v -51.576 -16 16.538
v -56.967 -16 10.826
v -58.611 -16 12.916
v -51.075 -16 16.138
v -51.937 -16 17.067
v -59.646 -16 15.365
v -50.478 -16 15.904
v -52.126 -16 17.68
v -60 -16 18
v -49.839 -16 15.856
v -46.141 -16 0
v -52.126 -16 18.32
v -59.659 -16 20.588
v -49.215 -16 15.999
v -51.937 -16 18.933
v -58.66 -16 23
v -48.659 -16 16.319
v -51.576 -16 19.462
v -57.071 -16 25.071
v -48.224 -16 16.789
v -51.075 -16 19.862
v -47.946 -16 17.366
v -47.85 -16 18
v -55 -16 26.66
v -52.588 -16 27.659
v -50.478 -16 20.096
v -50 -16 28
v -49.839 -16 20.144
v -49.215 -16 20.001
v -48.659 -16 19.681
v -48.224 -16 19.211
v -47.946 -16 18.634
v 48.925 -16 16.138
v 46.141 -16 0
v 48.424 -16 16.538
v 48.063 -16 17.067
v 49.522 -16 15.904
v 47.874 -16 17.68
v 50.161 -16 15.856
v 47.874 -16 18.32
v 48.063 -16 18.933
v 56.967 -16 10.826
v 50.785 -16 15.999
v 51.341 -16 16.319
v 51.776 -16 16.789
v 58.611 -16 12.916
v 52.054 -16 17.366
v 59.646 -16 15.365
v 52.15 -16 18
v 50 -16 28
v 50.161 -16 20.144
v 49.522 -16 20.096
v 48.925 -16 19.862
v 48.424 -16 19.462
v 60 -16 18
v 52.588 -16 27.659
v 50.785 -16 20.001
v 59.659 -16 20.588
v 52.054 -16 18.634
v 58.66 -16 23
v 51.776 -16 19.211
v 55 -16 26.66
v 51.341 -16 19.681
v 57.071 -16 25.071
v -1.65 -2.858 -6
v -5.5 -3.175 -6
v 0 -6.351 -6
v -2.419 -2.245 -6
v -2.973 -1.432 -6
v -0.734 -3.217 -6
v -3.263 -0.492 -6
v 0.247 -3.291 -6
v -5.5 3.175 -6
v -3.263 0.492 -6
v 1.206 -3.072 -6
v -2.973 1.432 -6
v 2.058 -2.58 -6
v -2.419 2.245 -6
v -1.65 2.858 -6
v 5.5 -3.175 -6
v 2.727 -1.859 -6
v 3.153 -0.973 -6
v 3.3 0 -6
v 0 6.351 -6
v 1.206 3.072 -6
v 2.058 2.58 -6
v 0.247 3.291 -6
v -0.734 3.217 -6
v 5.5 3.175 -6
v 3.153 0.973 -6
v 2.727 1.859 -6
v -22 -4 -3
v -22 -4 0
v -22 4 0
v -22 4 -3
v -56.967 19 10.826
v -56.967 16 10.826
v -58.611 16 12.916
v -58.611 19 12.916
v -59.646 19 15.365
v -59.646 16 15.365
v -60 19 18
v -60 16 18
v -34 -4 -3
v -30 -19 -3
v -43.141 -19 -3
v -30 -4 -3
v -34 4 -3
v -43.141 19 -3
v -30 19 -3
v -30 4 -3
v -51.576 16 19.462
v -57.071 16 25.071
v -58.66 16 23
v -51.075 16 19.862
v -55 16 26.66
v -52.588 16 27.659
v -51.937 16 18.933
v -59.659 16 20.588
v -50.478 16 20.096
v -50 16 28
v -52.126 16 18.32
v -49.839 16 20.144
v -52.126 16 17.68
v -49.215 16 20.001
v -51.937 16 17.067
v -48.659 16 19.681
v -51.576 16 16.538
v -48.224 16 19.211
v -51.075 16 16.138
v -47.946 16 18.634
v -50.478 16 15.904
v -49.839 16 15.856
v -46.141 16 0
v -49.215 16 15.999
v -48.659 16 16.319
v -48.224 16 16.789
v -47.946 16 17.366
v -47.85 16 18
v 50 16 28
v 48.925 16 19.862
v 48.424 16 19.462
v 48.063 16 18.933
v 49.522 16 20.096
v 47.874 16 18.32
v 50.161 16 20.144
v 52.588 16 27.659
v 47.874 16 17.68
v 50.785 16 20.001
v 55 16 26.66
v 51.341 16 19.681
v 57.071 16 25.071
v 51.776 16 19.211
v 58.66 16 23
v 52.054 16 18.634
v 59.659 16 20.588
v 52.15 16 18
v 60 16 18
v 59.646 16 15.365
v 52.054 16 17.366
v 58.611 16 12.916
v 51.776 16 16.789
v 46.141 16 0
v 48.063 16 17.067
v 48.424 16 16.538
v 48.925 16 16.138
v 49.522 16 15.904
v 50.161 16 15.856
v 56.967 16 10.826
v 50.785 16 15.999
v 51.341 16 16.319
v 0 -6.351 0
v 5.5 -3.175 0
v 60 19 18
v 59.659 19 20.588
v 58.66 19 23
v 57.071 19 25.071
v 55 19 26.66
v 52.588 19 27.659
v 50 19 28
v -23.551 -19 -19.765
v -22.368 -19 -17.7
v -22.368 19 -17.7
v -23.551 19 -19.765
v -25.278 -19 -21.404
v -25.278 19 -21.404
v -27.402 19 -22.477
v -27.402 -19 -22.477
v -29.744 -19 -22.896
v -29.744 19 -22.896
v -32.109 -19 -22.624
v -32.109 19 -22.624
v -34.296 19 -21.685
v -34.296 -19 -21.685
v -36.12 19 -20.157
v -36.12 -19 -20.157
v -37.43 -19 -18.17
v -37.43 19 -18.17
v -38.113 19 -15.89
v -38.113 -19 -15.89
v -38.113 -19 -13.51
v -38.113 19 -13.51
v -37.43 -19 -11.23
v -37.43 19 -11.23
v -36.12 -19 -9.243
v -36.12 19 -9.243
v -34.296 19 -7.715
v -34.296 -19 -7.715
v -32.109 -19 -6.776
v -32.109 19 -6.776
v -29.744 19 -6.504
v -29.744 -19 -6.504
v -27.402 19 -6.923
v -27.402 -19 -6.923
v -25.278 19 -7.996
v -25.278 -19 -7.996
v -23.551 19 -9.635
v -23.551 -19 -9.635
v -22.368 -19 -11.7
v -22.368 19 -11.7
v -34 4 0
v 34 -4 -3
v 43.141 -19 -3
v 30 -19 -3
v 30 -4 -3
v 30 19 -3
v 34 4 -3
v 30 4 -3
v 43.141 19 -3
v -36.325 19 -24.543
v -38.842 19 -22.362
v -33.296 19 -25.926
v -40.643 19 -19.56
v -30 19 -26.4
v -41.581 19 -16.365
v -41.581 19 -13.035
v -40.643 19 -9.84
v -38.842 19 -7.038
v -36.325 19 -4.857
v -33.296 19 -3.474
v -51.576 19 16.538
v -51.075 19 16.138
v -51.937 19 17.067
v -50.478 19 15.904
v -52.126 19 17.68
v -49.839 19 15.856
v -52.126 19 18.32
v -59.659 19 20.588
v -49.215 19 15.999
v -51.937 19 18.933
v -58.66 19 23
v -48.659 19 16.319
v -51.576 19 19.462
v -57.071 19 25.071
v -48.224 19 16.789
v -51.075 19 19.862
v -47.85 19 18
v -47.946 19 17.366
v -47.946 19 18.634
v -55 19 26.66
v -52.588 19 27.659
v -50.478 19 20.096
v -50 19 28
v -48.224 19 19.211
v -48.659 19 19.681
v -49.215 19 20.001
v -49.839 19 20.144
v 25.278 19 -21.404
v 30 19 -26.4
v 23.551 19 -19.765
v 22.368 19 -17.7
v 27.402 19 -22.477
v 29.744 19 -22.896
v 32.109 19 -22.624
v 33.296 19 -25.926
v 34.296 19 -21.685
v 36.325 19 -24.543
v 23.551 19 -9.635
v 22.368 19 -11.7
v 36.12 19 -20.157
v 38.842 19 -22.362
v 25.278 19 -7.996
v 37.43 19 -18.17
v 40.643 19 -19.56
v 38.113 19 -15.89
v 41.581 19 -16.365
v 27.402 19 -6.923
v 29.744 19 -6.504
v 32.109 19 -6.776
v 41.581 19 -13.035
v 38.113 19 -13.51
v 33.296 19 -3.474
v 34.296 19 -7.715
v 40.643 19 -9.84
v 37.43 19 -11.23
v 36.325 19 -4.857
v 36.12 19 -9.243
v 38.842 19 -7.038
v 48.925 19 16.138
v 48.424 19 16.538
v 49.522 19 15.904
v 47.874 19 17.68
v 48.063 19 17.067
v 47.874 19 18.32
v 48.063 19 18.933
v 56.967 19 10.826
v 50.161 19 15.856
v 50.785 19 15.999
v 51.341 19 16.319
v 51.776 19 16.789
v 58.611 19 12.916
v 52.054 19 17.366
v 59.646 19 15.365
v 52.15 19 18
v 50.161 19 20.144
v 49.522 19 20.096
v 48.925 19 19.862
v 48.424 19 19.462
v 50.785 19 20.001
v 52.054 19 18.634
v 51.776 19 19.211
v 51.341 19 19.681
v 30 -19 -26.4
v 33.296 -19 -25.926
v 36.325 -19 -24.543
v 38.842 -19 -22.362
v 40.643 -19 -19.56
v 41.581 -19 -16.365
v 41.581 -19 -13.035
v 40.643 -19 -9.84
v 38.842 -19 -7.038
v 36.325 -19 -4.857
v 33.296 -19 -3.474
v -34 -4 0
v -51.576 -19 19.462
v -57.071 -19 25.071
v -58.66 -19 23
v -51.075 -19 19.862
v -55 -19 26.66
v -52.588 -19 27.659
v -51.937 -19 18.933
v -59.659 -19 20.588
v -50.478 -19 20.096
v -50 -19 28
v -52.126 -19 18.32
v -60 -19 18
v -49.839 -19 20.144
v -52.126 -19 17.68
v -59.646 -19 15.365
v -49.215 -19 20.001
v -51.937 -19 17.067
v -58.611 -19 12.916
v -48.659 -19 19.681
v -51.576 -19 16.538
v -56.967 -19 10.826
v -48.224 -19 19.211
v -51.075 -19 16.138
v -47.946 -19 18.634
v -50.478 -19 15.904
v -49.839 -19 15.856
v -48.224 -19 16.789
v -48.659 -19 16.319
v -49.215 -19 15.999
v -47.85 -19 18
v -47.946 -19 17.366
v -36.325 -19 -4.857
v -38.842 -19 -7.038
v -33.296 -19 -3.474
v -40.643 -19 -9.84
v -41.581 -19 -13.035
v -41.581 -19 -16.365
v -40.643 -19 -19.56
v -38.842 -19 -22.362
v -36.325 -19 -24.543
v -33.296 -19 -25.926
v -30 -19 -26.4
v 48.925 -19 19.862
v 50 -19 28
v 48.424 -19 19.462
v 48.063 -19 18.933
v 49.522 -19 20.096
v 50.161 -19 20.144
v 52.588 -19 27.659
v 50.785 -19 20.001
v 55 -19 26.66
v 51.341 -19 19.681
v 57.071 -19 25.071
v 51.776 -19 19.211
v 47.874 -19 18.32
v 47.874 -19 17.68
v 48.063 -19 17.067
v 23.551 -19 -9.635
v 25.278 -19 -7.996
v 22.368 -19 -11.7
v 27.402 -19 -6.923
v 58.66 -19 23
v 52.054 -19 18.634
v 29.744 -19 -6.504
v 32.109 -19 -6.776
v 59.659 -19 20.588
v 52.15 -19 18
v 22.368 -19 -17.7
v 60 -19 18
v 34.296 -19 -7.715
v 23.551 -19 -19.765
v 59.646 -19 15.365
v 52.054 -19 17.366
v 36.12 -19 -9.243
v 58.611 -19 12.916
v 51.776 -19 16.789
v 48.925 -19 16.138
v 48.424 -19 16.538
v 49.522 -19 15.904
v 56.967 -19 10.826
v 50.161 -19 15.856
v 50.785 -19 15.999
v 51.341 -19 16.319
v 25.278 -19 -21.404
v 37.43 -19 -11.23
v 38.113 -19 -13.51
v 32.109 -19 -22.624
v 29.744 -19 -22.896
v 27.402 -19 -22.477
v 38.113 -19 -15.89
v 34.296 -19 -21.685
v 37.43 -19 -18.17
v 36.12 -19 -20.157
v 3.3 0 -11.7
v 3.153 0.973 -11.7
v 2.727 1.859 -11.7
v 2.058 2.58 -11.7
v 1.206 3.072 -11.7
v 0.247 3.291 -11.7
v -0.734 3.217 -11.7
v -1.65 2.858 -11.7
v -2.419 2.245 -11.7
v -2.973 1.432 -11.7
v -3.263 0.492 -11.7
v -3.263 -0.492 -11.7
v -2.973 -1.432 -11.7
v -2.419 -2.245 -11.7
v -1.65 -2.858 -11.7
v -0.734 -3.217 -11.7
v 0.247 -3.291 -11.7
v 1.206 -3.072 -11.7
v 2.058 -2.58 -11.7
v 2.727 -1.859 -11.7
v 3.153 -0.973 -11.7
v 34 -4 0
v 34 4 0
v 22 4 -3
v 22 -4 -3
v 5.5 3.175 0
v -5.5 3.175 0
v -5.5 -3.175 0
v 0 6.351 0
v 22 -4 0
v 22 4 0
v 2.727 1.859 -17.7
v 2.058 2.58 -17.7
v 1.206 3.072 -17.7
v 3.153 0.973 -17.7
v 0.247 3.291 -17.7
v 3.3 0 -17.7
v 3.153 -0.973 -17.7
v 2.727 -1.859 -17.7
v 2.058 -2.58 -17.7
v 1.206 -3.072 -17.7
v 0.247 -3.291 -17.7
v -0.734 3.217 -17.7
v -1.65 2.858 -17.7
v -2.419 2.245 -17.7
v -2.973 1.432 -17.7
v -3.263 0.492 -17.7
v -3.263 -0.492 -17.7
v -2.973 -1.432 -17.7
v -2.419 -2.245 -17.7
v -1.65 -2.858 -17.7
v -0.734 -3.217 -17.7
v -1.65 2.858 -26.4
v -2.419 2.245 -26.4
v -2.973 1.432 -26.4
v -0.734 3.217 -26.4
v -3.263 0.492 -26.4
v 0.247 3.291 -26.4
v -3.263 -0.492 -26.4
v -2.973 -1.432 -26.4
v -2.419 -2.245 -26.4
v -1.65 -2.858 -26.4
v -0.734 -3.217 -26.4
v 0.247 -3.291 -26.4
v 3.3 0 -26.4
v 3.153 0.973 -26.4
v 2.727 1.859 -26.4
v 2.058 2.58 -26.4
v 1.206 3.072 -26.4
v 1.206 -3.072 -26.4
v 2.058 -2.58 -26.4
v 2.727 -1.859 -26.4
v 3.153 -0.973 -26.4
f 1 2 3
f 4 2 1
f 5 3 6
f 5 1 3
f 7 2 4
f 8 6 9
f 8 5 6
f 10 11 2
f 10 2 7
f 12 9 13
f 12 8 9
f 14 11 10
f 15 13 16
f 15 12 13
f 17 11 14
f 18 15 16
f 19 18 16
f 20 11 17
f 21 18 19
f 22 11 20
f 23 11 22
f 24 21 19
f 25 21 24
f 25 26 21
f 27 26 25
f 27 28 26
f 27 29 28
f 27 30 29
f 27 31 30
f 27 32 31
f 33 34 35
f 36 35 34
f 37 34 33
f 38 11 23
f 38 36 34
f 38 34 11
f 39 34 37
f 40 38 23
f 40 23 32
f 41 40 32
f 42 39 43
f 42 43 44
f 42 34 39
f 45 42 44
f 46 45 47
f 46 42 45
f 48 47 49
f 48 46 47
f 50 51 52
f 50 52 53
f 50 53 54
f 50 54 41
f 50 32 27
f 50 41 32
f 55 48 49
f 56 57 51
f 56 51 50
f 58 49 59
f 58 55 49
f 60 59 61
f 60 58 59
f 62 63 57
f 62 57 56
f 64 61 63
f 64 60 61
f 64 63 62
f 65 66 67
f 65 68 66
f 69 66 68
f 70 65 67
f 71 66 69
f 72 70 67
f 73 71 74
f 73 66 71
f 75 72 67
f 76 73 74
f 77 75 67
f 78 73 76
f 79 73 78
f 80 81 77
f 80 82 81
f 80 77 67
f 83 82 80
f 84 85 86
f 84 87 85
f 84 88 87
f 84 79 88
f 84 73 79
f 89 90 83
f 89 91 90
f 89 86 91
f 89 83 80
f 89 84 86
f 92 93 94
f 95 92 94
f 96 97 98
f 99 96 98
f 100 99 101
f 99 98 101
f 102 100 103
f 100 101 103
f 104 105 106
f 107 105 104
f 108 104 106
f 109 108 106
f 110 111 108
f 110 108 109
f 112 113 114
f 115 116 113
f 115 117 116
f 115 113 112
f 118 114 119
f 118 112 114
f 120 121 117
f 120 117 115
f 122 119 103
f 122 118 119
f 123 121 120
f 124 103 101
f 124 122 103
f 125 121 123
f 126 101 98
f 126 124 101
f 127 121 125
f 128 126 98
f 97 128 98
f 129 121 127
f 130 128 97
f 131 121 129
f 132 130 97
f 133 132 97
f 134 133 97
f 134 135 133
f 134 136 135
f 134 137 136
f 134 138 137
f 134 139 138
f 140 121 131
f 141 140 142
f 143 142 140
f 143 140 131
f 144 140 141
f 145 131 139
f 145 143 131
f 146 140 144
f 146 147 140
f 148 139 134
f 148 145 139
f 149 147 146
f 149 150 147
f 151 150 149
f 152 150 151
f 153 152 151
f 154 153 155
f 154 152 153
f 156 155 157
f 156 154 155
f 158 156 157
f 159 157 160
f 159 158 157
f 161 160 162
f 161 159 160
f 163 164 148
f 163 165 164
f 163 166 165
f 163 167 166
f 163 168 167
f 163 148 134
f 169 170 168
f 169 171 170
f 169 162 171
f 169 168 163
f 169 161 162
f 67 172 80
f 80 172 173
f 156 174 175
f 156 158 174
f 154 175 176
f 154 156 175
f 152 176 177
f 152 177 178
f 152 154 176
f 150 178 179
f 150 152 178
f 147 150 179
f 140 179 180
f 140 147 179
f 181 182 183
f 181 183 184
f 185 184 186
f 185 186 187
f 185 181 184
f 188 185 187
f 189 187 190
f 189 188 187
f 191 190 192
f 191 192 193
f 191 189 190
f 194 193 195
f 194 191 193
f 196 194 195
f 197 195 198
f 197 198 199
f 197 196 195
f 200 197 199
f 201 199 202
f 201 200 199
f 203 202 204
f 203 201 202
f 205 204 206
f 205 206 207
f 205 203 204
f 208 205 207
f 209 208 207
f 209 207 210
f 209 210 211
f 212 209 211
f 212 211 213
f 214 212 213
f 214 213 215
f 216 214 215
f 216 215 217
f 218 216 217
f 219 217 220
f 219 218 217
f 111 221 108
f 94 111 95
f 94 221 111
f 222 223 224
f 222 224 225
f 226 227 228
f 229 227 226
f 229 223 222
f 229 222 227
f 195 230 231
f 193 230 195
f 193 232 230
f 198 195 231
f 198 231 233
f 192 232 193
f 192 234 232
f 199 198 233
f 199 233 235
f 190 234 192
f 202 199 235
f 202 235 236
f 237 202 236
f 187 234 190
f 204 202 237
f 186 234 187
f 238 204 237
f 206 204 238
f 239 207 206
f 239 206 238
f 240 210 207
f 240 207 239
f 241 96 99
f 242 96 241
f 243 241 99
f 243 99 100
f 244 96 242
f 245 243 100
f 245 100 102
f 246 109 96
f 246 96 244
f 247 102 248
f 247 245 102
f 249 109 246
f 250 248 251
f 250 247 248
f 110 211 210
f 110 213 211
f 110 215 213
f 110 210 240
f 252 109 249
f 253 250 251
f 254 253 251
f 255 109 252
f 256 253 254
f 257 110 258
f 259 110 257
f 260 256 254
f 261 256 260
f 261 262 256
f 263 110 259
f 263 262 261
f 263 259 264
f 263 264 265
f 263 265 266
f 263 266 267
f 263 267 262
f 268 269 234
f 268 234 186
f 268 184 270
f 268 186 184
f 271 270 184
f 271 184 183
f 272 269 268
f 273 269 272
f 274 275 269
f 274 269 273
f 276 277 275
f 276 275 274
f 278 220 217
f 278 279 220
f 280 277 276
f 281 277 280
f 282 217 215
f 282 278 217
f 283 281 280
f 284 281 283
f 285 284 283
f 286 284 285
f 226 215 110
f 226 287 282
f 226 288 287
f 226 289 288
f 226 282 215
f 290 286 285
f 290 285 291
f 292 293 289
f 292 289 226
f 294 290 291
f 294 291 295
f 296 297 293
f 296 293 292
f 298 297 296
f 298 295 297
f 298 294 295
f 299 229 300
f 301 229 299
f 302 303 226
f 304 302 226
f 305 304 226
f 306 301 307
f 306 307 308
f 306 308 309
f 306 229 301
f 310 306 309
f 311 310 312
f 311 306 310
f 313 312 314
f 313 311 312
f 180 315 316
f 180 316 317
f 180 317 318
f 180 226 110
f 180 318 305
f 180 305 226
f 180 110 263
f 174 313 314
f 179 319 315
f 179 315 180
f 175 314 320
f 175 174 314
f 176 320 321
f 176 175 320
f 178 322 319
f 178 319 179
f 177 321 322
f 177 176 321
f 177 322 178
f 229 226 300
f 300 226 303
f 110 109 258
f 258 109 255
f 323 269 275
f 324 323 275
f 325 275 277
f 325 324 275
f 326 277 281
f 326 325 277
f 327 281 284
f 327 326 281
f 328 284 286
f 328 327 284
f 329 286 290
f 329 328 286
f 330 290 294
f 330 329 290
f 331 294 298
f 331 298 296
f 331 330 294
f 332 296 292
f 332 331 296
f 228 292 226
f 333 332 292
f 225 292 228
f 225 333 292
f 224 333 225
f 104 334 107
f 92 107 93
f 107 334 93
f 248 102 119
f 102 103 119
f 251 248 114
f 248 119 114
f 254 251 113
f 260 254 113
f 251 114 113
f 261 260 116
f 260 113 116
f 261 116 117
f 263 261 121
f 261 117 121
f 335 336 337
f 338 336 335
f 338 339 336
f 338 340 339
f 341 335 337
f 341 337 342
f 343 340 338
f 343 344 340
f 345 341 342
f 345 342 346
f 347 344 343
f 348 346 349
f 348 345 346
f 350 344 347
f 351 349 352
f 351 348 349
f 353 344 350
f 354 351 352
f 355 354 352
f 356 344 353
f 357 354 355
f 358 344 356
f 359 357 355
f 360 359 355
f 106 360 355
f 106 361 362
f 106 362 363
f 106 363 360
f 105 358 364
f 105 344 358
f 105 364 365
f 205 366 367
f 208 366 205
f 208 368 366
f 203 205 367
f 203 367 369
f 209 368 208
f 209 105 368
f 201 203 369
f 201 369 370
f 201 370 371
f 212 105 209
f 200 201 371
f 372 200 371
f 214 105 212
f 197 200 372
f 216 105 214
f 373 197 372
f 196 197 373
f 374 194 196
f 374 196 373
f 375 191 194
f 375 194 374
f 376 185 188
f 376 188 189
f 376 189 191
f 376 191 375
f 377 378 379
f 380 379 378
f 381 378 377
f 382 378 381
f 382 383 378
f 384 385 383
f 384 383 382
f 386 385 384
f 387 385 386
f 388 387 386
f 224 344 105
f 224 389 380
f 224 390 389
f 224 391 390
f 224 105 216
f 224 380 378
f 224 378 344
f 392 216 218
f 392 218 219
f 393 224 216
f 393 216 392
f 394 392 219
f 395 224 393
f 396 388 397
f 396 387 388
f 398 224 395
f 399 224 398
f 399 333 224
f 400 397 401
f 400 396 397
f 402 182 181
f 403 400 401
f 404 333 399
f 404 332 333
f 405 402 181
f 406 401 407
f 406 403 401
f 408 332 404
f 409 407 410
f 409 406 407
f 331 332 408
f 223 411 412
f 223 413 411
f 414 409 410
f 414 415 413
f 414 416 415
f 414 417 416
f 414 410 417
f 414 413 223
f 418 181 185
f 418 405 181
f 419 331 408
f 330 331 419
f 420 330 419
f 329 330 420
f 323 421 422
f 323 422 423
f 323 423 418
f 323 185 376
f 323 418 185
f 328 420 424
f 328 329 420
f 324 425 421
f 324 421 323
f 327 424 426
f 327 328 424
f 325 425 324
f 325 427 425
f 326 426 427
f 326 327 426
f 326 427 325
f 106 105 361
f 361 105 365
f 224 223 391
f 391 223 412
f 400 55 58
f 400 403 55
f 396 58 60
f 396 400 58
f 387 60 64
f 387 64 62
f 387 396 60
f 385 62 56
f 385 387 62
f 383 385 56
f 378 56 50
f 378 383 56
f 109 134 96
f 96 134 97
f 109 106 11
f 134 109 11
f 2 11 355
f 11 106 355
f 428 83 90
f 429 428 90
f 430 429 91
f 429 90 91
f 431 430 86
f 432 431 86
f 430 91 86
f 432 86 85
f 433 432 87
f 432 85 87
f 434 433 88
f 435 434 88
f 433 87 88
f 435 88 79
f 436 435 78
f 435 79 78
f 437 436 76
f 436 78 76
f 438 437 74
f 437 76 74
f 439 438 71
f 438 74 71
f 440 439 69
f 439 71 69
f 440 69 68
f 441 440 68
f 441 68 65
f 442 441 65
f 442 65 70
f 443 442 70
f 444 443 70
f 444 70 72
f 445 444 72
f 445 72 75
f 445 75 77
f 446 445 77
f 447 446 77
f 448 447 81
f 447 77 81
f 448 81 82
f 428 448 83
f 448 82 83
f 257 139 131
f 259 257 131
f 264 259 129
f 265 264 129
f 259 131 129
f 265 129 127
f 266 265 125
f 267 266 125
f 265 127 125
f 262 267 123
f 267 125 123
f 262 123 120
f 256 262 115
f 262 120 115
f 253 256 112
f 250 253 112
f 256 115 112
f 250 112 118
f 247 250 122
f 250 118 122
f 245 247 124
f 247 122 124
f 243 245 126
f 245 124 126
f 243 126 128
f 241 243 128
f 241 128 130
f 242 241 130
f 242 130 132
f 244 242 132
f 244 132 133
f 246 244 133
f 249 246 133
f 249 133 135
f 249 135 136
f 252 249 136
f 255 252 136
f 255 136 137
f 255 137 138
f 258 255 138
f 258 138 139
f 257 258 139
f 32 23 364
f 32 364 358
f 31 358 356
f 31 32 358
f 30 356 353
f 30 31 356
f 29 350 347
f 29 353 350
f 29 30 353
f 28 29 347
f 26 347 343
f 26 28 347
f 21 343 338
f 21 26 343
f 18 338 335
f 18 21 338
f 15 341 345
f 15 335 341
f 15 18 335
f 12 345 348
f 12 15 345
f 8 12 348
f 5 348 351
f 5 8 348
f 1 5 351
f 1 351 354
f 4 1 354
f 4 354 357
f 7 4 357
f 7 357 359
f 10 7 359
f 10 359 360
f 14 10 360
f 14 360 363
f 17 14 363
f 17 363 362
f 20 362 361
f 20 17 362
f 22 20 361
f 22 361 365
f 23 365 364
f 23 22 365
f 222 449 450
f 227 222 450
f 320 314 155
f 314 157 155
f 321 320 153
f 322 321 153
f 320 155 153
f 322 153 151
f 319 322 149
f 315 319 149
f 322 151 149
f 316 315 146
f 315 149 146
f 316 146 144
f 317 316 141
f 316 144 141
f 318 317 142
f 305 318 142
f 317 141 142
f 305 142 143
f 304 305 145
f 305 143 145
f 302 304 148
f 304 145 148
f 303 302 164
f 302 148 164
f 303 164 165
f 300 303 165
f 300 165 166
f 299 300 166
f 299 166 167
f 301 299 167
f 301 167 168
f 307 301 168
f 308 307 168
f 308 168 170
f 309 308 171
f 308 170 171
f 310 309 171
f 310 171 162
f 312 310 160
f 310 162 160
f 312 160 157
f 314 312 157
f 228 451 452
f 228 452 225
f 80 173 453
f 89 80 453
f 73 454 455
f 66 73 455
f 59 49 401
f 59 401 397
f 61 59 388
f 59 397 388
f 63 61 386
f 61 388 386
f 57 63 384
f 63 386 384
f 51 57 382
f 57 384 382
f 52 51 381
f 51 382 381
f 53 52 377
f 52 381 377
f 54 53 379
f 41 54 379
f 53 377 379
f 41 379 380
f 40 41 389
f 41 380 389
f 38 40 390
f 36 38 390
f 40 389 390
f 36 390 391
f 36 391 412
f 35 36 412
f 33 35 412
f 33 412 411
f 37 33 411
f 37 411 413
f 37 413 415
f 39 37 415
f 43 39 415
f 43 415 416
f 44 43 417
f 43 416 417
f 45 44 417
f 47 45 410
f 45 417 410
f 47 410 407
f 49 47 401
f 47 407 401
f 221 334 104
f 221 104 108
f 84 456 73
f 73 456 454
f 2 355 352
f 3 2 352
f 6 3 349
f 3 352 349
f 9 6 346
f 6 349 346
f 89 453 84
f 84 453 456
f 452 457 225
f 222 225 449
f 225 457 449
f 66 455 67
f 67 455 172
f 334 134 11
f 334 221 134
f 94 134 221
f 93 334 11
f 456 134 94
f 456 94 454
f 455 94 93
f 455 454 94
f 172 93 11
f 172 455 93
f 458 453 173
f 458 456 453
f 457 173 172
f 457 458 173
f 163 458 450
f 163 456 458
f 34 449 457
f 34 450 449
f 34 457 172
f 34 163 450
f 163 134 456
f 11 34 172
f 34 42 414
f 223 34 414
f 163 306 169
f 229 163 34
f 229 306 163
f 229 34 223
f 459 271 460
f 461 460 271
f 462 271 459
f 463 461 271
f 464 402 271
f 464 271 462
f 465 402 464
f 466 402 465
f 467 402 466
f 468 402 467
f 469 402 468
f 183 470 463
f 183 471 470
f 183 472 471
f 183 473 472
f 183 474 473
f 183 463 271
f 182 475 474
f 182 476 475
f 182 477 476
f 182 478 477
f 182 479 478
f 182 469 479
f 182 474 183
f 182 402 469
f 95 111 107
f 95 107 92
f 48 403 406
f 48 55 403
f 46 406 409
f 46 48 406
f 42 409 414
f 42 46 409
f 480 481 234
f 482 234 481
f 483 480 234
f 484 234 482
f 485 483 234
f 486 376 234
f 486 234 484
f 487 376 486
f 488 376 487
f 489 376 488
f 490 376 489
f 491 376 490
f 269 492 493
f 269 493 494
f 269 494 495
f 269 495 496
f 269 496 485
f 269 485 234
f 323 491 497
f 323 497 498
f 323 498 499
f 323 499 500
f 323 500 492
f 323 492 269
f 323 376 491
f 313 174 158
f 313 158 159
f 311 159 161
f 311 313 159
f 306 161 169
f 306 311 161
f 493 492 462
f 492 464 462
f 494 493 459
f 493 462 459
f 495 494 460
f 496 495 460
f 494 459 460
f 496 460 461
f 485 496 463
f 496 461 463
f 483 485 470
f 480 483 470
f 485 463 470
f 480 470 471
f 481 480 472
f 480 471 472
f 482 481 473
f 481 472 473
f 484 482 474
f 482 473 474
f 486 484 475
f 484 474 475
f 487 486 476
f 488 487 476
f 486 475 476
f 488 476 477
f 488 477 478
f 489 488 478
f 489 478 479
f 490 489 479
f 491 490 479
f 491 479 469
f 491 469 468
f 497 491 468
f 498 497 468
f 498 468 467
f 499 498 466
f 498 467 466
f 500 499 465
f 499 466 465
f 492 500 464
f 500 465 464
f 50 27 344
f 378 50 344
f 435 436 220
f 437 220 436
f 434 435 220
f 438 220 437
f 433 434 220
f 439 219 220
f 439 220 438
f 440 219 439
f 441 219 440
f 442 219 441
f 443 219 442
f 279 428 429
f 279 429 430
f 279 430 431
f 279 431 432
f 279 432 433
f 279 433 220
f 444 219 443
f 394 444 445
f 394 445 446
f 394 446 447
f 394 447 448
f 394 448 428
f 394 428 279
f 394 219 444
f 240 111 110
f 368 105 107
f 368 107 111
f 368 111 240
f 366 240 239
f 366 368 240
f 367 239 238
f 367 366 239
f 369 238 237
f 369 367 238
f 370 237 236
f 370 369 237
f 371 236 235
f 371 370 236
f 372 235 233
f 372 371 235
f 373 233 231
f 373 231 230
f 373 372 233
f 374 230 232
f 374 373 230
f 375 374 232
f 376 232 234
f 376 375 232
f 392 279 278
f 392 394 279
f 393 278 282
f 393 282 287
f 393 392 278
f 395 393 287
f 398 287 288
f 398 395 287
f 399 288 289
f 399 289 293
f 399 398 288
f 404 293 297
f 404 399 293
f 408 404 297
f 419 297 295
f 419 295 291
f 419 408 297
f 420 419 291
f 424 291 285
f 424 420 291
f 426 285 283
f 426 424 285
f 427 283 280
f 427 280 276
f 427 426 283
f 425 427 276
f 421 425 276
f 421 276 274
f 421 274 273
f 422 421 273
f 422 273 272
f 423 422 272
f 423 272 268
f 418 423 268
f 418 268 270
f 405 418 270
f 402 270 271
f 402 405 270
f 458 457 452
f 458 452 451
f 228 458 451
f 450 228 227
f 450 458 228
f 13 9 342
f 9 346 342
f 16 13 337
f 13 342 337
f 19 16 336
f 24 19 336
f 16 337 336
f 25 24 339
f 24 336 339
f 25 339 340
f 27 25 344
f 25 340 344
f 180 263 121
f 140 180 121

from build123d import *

# Parameters (mm, degrees)
F2_DEPTH  = 60
F4_DEPTH  = 19
F0_R      = 2.15
F5_DEPTH  = 30.3
F6_R      = 10
F7_R      = 3.3
F8_DEPTH  = 29.5
F10_DEPTH = 6
F9_W      = 12
F9_H      = 8
F11_DEPTH = 3
F13_DEPTH = 25


with BuildPart() as f2:
    # F1 (on Right) → F2 (new body, symmetric)
    with BuildSketch(Plane.YZ):
        Polygon((16, 0), (-16, 0), (-16, 28), (-19, 28), (-19, -3), (19, -3), (19, 28), (16, 28), align=None)
    extrude(amount=F2_DEPTH, both=True)

    # F3 (on Front) → F4 (join, symmetric)
    with BuildSketch(Plane.XZ):
        with BuildLine():
            Line((0, -3), (-30, -3))
            ThreePointArc((-30, -3), (-41.7, -14.7), (-30, -26.4))
            Line((-30, -26.4), (0, -26.4))
            Line((0, -26.4), (30, -26.4))
            ThreePointArc((30, -26.4), (41.7, -14.7), (30, -3))
            Line((30, -3), (0, -3))
        make_face()
        with BuildLine():
            ThreePointArc((-22.368486, -17.7), (-38.2, -14.7), (-22.368486, -11.7))
            Line((-22.368486, -11.7), (0, -11.7))
            Line((0, -11.7), (22.368486, -11.7))
            ThreePointArc((22.368486, -11.7), (38.2, -14.7), (22.368486, -17.7))
            Line((22.368486, -17.7), (0, -17.7))
            Line((0, -17.7), (-22.368486, -17.7))
        make_face(mode=Mode.SUBTRACT)
    extrude(amount=F4_DEPTH, both=True)

    # F0 (on Front) → F5 (cut, symmetric)
    with BuildSketch(Plane.XZ):
        with Locations((-50, 18)):
            Circle(F0_R)
        with Locations((50, 18)):
            Circle(F0_R)
    extrude(amount=F5_DEPTH, both=True, mode=Mode.SUBTRACT)

    # F6
    f6_edges = [f2.edges().sort_by_distance(p)[0] for p in [
        (-60, -17.5, 28),
        (-60, 17.5, 28),
        (60, 17.5, 28),
        (60, -17.5, 28),
    ]]
    fillet(f6_edges, radius=F6_R)

    # F7 (on Top) → F8 (cut, symmetric)
    with BuildSketch(Plane.XY):
        Circle(F7_R)
    extrude(amount=F8_DEPTH, both=True, mode=Mode.SUBTRACT)

    # F9 (on Top) → F10 (cut)
    with BuildSketch(Plane.XY):
        Polygon((5.5, -3.175426), (5.5, 3.175426), (0, 6.350853), (-5.5, 3.175426), (-5.5, -3.175426), (0, -6.350853), align=None)
    extrude(amount=-F10_DEPTH, mode=Mode.SUBTRACT)

    # F9 (on Top) → F11 (cut)
    with BuildSketch(Plane.XY):
        with Locations((-28, 0)):
            Rectangle(F9_W, F9_H)
        with Locations((28, 0)):
            Rectangle(F9_W, F9_H)
    extrude(amount=-F11_DEPTH, mode=Mode.SUBTRACT)

    # F12 (on Front) → F13 (cut, symmetric)
    with BuildSketch(Plane.XZ):
        with BuildLine():
            Line((56.966549, 10.825936), (43.140613, -3))
            Line((43.140613, -3), (66.425517, -3))
            Line((66.425517, -3), (66.425517, 22.940923))
            Line((66.425517, 22.940923), (58.694095, 22.940923))
            ThreePointArc((58.694095, 22.940923), (59.899857, 16.588322), (56.966549, 10.825936))
        make_face()
        with BuildLine():
            ThreePointArc((-56.966549, 10.825936), (-59.899857, 16.588322), (-58.694095, 22.940923))
            Line((-58.694095, 22.940923), (-66.425517, 22.940923))
            Line((-66.425517, 22.940923), (-66.425517, -3))
            Line((-66.425517, -3), (-43.140613, -3))
            Line((-43.140613, -3), (-56.966549, 10.825936))
        make_face()
    extrude(amount=F13_DEPTH, both=True, mode=Mode.SUBTRACT)


solid = f2.part
